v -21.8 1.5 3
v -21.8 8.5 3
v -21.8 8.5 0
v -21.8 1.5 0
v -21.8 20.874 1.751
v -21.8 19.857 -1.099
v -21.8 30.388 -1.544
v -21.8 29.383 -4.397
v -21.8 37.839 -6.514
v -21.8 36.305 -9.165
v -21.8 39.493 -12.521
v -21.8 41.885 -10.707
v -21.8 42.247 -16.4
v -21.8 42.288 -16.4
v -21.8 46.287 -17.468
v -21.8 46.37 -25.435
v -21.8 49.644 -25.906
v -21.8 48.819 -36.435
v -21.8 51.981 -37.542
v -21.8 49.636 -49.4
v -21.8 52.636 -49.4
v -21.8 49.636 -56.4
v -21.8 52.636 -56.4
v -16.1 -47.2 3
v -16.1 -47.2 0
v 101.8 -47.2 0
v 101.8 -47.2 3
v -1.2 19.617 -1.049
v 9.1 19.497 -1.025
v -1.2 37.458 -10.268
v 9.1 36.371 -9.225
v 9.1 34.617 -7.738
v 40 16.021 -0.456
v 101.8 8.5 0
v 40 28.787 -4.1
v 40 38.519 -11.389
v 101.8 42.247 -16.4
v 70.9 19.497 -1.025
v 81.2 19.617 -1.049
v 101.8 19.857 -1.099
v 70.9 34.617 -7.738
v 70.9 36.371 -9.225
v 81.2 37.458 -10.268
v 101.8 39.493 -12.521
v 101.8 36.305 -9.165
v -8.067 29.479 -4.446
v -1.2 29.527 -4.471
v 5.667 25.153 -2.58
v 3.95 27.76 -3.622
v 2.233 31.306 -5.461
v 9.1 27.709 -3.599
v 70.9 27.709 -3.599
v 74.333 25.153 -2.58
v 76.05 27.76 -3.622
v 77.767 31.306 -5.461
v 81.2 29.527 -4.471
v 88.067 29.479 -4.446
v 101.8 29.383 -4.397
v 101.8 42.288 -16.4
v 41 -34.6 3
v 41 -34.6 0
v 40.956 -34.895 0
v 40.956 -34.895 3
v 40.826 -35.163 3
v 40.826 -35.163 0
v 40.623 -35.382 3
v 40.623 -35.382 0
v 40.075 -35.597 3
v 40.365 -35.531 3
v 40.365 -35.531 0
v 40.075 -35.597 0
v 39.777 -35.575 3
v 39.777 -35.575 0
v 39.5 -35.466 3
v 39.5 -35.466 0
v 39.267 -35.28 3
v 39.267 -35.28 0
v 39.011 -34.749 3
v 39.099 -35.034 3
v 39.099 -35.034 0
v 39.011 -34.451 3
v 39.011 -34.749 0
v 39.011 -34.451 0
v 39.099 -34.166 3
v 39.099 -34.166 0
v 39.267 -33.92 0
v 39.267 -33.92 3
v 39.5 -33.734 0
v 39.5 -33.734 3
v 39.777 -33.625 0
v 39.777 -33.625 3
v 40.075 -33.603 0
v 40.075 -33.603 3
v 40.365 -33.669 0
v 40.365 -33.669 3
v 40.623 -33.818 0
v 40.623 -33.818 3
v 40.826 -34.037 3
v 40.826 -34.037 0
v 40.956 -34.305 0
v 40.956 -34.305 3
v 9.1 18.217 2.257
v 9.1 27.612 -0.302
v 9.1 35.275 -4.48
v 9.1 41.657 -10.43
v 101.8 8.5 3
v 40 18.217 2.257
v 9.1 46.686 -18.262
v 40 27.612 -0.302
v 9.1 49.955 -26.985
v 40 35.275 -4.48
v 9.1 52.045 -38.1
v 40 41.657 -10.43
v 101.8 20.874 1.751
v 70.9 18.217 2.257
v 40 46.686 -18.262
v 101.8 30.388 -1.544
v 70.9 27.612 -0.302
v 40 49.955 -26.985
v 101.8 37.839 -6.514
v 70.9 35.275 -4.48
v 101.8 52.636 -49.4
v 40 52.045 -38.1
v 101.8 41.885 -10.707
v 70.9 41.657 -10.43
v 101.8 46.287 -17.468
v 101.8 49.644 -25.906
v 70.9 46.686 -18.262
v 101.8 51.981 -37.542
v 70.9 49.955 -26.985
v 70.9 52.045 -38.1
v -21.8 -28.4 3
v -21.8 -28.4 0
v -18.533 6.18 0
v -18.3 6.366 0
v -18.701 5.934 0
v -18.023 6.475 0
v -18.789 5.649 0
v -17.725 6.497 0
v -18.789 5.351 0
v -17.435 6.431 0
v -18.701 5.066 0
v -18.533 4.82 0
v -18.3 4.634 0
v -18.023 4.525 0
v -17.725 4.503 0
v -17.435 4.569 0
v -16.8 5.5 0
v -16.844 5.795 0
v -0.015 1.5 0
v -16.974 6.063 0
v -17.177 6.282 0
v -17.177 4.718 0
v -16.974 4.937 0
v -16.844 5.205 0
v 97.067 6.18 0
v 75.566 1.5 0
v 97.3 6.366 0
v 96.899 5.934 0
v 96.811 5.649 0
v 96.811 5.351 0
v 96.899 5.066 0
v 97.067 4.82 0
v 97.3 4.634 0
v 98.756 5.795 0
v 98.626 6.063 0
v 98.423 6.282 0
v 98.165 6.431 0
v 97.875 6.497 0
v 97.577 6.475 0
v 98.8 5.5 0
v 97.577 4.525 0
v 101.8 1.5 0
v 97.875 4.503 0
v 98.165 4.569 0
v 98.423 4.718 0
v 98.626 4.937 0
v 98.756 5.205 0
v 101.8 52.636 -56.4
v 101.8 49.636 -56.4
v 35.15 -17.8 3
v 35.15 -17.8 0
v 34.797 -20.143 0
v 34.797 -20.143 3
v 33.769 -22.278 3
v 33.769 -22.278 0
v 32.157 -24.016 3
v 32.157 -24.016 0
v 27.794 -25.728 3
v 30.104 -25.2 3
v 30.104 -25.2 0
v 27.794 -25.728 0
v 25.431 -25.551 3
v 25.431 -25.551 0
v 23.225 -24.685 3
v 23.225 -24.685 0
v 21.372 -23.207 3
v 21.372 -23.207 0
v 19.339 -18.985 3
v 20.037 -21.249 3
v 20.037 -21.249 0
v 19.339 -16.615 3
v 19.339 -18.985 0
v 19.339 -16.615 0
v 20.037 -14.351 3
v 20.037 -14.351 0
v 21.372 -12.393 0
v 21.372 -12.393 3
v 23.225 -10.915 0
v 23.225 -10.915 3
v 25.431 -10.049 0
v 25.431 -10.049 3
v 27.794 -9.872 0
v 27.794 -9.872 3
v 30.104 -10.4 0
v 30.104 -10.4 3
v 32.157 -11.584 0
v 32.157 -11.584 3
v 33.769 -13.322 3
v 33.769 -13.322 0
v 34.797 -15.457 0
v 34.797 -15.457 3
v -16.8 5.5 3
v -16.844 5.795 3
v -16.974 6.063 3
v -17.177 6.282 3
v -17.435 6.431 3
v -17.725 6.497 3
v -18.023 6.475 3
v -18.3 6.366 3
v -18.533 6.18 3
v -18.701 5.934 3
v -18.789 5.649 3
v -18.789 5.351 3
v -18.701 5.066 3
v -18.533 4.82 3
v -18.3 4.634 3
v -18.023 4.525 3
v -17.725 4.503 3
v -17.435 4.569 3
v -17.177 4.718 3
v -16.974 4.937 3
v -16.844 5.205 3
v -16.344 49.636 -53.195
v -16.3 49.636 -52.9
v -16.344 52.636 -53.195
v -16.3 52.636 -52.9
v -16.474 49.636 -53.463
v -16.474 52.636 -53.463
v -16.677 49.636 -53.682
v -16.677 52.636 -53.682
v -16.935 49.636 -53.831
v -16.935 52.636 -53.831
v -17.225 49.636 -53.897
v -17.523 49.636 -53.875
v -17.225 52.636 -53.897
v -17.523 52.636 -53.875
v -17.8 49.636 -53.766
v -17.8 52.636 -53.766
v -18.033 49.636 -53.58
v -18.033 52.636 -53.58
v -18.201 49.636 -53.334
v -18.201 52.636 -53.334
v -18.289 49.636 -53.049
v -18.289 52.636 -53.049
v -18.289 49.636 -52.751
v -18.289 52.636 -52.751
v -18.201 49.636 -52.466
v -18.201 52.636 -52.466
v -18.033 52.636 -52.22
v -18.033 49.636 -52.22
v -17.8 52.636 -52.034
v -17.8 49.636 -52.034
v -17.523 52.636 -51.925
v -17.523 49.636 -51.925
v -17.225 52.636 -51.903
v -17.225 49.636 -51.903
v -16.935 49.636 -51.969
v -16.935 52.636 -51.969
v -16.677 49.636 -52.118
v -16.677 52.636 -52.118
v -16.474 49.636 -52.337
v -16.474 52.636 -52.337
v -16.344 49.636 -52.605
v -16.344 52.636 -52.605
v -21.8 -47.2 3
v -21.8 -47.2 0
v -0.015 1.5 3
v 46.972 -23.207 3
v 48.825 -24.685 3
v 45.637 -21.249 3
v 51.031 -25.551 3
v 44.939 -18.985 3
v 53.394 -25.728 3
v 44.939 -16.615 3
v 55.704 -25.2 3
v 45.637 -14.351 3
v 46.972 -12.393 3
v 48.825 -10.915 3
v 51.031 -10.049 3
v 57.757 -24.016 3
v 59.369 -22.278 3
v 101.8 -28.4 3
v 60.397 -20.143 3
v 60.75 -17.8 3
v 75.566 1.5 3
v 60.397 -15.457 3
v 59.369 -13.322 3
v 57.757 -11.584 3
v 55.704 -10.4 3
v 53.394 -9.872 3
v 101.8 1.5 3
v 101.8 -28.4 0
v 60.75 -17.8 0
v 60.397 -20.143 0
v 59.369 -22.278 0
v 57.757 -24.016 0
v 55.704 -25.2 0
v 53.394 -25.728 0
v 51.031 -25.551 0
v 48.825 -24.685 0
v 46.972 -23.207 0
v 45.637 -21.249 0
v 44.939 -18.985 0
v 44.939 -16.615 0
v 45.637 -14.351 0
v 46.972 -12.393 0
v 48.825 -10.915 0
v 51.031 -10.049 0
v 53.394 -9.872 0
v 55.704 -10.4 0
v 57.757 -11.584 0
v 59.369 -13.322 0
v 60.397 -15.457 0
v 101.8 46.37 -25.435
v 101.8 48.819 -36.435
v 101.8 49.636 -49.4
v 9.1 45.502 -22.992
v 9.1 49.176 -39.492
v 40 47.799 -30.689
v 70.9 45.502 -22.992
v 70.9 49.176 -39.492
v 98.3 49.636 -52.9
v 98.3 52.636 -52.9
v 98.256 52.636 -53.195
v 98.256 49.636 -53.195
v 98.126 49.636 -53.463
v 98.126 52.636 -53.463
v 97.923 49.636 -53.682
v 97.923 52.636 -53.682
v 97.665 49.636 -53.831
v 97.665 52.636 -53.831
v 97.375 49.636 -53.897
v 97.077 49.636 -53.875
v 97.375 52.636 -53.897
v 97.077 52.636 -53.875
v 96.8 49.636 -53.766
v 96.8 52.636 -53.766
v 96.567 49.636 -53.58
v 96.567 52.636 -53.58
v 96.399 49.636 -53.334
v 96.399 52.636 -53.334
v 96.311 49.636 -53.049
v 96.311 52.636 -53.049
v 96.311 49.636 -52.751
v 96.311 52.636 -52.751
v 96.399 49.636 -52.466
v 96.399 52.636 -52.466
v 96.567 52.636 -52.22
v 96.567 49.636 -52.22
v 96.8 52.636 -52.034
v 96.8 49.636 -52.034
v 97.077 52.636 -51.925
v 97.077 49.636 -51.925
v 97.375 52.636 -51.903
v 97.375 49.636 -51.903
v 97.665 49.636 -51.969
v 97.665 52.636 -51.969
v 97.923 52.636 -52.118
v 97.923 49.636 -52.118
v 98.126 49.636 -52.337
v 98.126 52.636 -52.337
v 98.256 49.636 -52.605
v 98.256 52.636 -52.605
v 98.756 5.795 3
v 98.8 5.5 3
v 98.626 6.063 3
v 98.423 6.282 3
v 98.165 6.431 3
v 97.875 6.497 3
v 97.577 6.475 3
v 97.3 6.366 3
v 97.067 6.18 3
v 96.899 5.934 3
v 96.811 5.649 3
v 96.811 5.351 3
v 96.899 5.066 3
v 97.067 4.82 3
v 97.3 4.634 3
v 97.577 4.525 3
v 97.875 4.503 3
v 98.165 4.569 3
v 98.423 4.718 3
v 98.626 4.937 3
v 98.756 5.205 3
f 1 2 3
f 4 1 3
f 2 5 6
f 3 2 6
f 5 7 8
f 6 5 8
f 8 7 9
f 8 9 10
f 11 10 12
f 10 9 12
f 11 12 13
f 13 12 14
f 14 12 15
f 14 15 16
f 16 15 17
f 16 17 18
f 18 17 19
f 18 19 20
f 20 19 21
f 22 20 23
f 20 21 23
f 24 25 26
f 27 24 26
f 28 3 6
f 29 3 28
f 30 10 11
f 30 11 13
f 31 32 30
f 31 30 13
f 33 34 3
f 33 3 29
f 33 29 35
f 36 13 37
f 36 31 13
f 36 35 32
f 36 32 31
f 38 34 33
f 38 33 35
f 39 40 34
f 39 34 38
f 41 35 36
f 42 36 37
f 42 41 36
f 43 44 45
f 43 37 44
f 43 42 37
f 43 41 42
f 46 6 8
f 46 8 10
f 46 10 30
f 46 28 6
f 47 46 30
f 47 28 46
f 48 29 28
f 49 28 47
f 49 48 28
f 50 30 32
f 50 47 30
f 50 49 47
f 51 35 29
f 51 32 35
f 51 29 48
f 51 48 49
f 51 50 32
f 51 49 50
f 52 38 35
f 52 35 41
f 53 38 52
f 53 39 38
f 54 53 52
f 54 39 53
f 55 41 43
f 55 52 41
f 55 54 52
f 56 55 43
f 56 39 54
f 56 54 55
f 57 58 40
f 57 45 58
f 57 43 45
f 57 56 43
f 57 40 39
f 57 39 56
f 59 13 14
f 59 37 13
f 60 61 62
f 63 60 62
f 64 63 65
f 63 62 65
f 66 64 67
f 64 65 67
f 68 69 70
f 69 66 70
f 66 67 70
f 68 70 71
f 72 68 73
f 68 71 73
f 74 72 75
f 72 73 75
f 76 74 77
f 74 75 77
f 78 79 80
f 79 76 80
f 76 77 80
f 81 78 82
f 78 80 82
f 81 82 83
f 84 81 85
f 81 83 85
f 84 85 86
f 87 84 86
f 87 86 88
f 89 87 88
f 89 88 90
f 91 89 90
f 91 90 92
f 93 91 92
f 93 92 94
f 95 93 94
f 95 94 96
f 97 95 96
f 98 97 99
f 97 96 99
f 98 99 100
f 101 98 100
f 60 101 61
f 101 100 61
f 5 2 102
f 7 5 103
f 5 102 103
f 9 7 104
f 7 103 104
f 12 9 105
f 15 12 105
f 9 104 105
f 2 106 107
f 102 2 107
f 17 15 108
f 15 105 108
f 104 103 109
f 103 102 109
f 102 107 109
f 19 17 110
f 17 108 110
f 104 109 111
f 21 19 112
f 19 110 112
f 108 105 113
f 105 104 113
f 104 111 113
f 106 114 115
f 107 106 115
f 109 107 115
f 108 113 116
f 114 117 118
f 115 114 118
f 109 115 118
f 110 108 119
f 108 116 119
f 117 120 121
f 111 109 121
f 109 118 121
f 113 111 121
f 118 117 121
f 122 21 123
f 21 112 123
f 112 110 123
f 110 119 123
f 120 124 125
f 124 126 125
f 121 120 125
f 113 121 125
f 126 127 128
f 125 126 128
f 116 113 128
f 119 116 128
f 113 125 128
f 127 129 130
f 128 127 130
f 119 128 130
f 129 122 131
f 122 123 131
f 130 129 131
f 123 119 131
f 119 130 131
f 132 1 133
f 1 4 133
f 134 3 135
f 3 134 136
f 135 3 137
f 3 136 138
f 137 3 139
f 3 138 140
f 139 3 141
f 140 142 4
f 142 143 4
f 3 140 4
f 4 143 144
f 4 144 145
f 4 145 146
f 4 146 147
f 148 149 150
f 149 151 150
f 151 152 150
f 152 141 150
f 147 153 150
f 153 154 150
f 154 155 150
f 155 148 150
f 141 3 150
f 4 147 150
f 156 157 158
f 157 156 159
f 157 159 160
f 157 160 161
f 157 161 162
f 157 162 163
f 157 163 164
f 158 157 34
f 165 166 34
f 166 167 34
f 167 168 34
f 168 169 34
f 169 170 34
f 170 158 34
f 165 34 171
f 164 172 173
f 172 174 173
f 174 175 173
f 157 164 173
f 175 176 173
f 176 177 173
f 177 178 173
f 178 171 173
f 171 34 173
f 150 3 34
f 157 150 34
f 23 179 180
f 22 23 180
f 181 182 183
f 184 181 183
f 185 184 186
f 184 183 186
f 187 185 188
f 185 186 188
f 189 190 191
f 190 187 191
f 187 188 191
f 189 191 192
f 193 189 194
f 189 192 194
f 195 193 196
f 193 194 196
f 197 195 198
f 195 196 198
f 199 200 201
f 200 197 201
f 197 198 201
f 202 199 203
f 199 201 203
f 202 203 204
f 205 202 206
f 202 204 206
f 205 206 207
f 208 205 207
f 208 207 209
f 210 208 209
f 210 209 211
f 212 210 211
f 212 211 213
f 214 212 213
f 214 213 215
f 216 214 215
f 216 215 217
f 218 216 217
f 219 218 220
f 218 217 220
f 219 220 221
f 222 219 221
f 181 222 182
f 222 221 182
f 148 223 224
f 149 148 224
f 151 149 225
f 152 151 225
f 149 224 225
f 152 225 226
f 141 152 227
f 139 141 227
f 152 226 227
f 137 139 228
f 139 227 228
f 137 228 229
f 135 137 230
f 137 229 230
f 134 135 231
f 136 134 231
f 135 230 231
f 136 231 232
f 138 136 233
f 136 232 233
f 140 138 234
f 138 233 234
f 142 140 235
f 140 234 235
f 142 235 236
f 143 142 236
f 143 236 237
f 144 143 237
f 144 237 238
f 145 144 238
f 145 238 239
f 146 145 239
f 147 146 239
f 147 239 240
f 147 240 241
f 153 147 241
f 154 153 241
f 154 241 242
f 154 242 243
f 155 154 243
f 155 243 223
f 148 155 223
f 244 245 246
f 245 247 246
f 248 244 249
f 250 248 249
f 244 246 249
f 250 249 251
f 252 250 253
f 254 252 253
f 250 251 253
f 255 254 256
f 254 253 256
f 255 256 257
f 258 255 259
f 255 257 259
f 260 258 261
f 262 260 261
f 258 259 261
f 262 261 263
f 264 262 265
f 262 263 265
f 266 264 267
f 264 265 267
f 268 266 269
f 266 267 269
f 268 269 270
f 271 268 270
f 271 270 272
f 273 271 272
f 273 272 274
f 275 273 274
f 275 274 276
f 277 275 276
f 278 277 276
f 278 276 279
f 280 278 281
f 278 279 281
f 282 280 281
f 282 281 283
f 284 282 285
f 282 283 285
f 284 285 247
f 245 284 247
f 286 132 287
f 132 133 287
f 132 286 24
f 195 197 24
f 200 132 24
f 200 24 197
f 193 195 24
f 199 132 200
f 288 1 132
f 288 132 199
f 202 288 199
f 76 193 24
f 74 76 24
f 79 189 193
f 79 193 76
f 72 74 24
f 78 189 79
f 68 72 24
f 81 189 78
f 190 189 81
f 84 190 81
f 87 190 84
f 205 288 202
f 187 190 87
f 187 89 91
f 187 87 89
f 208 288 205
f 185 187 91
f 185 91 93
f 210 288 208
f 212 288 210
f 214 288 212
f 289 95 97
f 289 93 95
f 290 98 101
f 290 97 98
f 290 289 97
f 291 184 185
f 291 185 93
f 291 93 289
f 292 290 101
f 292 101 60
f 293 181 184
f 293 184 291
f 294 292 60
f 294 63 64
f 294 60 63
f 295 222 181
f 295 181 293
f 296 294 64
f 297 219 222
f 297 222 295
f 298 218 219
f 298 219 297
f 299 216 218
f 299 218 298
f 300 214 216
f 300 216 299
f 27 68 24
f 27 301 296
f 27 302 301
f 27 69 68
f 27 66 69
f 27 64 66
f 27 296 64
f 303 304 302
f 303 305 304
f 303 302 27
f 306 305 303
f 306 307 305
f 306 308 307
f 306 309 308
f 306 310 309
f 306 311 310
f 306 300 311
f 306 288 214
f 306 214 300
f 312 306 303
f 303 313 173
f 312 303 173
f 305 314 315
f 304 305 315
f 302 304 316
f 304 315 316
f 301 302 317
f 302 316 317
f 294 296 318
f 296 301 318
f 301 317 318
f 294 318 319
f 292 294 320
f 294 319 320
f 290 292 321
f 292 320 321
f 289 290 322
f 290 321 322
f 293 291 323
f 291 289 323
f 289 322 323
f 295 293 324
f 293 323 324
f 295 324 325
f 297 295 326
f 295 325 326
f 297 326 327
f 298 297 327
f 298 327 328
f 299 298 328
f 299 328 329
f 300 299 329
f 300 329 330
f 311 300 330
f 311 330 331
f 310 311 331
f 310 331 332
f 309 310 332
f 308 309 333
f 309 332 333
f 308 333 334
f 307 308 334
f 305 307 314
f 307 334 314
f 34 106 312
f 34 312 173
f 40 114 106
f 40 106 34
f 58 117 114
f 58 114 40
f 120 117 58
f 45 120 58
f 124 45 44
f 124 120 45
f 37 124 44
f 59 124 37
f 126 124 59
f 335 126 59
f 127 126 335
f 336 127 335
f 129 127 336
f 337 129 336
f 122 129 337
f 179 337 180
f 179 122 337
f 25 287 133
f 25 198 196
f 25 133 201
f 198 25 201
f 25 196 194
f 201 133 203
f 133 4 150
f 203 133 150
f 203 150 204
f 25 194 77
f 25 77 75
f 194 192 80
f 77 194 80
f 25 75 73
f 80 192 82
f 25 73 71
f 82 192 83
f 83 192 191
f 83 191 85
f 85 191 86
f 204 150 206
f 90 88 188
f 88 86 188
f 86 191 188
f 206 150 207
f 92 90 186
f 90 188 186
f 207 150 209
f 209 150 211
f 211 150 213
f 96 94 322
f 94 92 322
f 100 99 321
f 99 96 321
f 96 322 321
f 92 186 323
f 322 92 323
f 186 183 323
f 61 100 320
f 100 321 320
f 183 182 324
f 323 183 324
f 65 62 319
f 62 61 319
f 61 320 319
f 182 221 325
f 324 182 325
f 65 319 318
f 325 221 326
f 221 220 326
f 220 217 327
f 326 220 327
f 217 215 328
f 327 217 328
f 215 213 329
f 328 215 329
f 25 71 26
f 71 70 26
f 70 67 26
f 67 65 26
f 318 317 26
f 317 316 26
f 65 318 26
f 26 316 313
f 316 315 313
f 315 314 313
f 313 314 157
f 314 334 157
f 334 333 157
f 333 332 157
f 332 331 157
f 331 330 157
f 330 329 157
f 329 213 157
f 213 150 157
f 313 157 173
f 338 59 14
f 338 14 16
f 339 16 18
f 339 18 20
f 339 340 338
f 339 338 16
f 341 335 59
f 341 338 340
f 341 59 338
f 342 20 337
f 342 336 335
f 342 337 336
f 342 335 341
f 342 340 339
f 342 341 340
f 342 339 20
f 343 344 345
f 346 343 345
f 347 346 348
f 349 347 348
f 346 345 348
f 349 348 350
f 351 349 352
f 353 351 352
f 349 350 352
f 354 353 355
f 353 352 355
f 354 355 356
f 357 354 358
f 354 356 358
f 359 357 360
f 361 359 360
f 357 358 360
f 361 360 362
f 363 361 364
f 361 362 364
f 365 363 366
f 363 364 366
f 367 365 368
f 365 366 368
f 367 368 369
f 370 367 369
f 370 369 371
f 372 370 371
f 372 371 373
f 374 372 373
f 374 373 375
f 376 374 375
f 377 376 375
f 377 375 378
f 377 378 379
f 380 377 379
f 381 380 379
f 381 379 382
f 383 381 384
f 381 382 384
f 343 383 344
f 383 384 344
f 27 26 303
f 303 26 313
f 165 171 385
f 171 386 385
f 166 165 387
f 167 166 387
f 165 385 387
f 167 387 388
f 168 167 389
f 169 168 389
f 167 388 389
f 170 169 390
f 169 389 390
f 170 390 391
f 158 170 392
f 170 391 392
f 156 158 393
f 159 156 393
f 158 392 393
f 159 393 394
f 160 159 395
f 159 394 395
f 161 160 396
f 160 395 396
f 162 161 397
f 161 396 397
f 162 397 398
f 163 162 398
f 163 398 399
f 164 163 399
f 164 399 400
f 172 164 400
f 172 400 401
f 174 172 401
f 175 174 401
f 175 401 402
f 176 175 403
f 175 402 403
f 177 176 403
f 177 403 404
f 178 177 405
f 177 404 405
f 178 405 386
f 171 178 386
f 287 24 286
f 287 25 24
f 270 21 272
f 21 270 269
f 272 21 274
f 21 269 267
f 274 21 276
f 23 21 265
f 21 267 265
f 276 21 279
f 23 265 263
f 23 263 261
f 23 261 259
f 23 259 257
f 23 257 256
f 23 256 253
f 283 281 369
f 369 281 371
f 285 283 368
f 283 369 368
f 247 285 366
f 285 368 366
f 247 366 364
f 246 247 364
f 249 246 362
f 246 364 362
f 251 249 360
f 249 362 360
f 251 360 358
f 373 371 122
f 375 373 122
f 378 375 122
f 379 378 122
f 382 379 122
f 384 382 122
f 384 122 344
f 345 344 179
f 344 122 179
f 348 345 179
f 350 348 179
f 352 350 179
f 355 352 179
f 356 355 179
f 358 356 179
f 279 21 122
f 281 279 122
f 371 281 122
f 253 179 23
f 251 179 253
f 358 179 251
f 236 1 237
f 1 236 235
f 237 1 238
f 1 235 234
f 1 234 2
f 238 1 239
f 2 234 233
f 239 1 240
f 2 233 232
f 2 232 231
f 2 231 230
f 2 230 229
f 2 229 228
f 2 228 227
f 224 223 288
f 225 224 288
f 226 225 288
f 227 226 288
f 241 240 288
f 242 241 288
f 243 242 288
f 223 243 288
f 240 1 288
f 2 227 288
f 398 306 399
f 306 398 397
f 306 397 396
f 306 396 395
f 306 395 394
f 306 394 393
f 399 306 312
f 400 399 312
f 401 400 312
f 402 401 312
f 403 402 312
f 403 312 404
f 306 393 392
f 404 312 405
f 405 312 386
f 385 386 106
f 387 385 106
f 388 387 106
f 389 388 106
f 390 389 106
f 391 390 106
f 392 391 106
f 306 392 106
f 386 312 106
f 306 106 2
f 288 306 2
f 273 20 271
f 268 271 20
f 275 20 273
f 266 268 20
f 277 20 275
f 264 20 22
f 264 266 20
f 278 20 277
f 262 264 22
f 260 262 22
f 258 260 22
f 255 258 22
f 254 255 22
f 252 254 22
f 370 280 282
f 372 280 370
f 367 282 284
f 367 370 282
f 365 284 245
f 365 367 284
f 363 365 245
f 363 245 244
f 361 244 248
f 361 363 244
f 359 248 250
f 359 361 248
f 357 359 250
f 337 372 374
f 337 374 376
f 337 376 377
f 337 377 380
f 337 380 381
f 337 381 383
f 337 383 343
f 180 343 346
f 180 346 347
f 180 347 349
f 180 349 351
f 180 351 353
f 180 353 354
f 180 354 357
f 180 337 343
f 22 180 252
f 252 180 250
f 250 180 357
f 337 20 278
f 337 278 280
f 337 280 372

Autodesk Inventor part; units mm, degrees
ref_plane "YZ Plane" through (0, 0, 0) normal (1, 0, 0) x (0, 1, 0)
ref_plane "XZ Plane" through (0, 0, 0) normal (0, 1, 0) x (-1, 0, 0)
ref_plane "XY Plane" through (0, 0, 0) normal (0, 0, 1) x (1, 0, 0)
sketch "Esboço1" plane through (0, 0, 0) normal (0, 0, 1) x (1, 0, 0)
  line L0 (-21.8, -28.4) -> (-21.8, -58.8) projected
  line L1 (-16.1, -47.2) -> (-23.9, -47.2) projected
  line L2 (-26.1, 49.6356) -> (-29.1, 49.6356) projected
  line L3 (-21.8, -47.2) -> (101.8, -47.2)
  line L4 (101.8, -47.2) -> (101.8, 49.6356)
  line L5 (101.8, 49.6356) -> (-21.8, 49.6356)
  line L6 (-21.8, 49.6356) -> (-21.8, -47.2)
  line L7 (101.8, -28.4) -> (101.8, -58.8) projected
  circle A0 centre (27.2, -17.8) radius 7.95 projected
  circle A1 centre (52.8, -17.8) radius 7.95 projected
  circle A2 centre (40, -34.6) radius 1 projected
  line L8 (-0.0154, 1.5) -> (75.5655, 1.5) projected
  line L9 (75.5655, 1.5) -> (106.1, 1.5) projected
  line L10 (-26.1, 1.5) -> (-0.0154, 1.5) projected
  point P0 (0, 0)
  point P1 (-21.8, 1.5)
  point P2 (101.8, 1.5)
  dimension "d0" = 0
extrude "Extrusão1" add sketch "Esboço1" along normal blind 3 contours L6 L10 L8 L9 L4 L3 L1 L0
sketch "Esboço2" plane through (101.8, -47.2, 0) normal (1, 0, 0) x (0, 0, -1)
  line L0 (0, 48.7) -> (0, 0)
  line L1 (0, 48.7) -> (-3, 48.7)
  line L2 (-3, 48.7) -> (-3, 55.7)
  line L3 (-3, 55.7) -> (0, 55.7)
  line L4 (0, 55.7) -> (0, 48.7)
  line L5 (16.4, 7.2) -> (16.4, 89.4875)
  line L6 (67.3088, 7.2) -> (16.4, 7.2)
  line L7 (57.4544, 17.0544) -> (67.3088, 7.2)
  arc A0 (56.4, 19.6) -> (57.4544, 17.0544) centre (60, 19.6) ccw
  line L8 (56.4, 35.6) -> (56.4, 19.6)
  arc A1 (63.6, 35.6) -> (56.4, 35.6) centre (60, 35.6) ccw
  line L9 (63.6, 21.0912) -> (63.6, 35.6)
  line L10 (77.4912, 7.2) -> (63.6, 21.0912)
  line L11 (109.9, 7.2) -> (77.4912, 7.2)
  line L12 (109.9, 77.4021) -> (109.9, 7.2)
  line L13 (53.4, 87.3646) -> (109.9, 77.4021)
  line L14 (53.4, 90.3646) -> (53.4, 87.3646)
  line L15 (56.4, 90.3646) -> (53.4, 90.3646)
  line L16 (56.4, 96.8356) -> (56.4, 90.3646)
  line L17 (49.4, 96.8356) -> (56.4, 96.8356)
  spline S0 degree 2 poles (16.4, 89.4875) (28.4788, 96.8356) (49.4, 96.8356) knots 0 0 0 1 1 1
  circle A2 centre (49.1, 41) radius 0.8
  line L18 (0, 55.7) -> (0, 96.8356) construction
  line L19 (0, 96.8356) -> (49.4, 96.8356) construction
  spline S1 degree 2 poles (0, 55.7) (0, 96.8356) (49.4, 96.8356) knots 1 1 1 2 2 2
  line L20 (49.4, 99.8356) -> (56.4, 99.8356)
  line L21 (56.4, 99.8356) -> (56.4, 96.8356)
  line L22 (56.4, 96.8356) -> (49.4, 96.8356)
  line L23 (49.4, 96.8356) -> (49.4, 99.8356)
  spline S2 degree 5 poles (-3, 55.7) (-3.0006, 59.6028) (-2.7317, 63.5042) (-2.1469, 67.3846) (-0.2515, 74.6) (3.2657, 81.1646) (5.3254, 84.0489) (10.316, 89.3567) (16.4783, 93.2583) (19.8737, 94.8743) (27.6563, 97.7143) (35.8292, 99.1582) (40.3418, 99.6246) (44.8718, 99.8357) (49.4, 99.8356) knots 0 0 0 0 0 0 0.249163 0.249163 0.249163 0.472611 0.472611 0.472611 0.710868 0.710868 0.710868 1 1 1 1 1 1
  point P0 (0, 47.2)
  point P1 (16.4, 89.4467)
  dimension "d3" = 7
extrude "Extrusão2" add sketch "Esboço2" against normal blind 123.6 contours L1 L2 L3 L4 | L3 S2 L23 S0 L5 S1 | L20 L21 L17 L23
sketch "Esboço3" plane through (0, 0, 3) normal (0, 0, 1) x (1, 0, 0)
  circle A0 centre (-17.8, 5.5) radius 1 projected
  circle A1 centre (97.8, 5.5) radius 1 projected
  point P0 (0, 0)
extrude "Extrusão3" cut sketch "Esboço3" against normal blind 6
sketch "Esboço4" plane through (101.8, 52.6356, -49.4) normal (0, 1, 0) x (1, 0, 0)
  circle A0 centre (-119.1, 3.5) radius 1 projected
  circle A1 centre (-4.5, 3.5) radius 1 projected
  point P0 (-101.8, -49.4)
extrude "Extrusão4" cut sketch "Esboço4" against normal blind 6
properties part number "frente recurva"
